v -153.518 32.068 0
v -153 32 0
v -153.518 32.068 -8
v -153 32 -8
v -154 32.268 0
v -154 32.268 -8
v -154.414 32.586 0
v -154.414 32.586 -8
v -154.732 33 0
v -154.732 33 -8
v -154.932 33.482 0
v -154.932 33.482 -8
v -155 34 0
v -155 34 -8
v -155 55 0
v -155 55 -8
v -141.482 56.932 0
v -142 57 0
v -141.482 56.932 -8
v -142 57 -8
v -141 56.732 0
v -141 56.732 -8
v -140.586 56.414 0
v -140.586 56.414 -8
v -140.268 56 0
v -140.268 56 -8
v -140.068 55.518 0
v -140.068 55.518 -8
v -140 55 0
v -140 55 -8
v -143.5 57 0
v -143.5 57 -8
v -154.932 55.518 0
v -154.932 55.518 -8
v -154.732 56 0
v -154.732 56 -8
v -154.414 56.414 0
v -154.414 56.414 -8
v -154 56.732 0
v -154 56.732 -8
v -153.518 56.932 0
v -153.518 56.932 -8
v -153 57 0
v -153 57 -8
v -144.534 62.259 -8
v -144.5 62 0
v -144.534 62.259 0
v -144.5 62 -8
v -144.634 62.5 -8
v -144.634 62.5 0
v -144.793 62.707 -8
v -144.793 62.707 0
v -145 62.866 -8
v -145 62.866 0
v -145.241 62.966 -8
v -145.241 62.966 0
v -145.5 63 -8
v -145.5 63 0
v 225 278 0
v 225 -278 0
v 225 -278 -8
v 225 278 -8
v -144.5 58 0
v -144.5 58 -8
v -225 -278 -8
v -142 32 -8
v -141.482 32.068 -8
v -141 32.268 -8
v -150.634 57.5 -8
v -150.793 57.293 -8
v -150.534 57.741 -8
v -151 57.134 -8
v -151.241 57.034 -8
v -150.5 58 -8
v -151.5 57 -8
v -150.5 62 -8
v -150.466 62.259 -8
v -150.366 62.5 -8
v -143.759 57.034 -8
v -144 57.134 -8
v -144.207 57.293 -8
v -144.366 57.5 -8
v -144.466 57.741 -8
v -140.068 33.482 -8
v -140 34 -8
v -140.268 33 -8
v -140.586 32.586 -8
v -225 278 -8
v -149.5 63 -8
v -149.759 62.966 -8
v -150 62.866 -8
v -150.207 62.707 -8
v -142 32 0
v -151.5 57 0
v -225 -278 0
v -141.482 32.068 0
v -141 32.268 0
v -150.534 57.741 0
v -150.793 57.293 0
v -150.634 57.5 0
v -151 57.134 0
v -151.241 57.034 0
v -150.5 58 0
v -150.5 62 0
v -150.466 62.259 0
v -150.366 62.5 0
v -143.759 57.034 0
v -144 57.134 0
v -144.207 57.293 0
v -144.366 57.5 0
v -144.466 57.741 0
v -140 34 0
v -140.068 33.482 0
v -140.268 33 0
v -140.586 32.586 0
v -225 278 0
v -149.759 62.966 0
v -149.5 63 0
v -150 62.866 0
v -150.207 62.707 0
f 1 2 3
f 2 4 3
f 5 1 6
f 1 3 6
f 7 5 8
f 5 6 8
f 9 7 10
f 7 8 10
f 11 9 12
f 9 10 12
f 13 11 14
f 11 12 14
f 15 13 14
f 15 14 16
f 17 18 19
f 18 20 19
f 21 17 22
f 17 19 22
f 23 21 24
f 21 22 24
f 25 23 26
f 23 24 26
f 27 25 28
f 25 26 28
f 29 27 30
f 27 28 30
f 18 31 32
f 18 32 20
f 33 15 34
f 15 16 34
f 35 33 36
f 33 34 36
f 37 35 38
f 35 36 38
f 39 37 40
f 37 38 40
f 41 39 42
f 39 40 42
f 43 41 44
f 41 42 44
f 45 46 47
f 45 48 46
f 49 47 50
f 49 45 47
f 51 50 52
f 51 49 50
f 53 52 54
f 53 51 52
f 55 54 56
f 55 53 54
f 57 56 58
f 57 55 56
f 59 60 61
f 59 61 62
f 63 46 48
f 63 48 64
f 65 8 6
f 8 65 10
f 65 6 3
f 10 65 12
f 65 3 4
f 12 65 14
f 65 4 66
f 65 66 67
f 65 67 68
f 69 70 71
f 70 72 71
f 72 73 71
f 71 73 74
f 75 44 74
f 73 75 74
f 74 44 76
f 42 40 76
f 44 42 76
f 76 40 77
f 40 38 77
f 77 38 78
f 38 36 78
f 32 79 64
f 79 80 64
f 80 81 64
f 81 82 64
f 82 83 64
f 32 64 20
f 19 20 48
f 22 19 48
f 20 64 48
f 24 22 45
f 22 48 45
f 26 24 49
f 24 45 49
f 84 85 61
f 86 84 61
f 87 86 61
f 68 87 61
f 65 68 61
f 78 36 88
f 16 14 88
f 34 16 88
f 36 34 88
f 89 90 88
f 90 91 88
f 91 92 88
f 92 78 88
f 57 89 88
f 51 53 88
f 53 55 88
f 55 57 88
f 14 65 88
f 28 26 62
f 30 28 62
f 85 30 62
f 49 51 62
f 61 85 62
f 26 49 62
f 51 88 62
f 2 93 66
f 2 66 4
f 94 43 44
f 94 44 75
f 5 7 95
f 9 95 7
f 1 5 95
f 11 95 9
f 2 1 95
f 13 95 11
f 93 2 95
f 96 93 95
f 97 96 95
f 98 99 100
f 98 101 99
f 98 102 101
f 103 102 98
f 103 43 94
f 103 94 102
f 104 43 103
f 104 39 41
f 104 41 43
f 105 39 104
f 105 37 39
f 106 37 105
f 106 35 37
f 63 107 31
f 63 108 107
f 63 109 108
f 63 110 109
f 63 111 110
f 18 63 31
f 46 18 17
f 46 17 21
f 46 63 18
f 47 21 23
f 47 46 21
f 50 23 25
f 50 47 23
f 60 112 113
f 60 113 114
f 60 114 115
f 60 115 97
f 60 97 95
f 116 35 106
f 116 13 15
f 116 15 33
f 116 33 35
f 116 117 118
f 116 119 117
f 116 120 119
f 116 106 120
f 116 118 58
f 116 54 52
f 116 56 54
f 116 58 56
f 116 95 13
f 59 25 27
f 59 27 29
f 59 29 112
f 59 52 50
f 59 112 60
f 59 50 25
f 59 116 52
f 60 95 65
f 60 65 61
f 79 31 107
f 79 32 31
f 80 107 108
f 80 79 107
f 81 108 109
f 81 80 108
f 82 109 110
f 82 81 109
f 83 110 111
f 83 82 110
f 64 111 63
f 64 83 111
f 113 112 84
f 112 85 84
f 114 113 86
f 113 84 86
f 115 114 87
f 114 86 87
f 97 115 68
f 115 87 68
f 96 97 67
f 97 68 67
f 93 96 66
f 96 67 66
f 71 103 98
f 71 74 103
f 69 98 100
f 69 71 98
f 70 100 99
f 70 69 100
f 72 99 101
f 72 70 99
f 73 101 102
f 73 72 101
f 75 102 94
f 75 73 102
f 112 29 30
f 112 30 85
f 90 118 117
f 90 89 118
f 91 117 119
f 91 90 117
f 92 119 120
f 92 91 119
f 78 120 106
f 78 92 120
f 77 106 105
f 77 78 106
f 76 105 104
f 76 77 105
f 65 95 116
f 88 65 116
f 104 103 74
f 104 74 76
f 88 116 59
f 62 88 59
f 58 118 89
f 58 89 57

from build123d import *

# Parameters (mm, degrees)
F0_W     = 450
F0_H     = 556
F1_DEPTH = 8
F2_R     = 1
F3_R     = 2


with BuildPart() as f1:
    # F0 (on Top) → F1 (new body)
    with BuildSketch(Plane.XY):
        Rectangle(F0_W, F0_H)
        Polygon((-155, 32), (-155, 57), (-150.5, 57), (-150.5, 63), (-144.5, 63), (-144.5, 57), (-140, 57), (-140, 32), align=None, mode=Mode.SUBTRACT)
    extrude(amount=-F1_DEPTH)

    # F2
    f2_edges = [f1.edges().sort_by_distance(p)[0] for p in [
        (-144.5, 57, -4),
        (-150.5, 57, -4),
        (-144.5, 63, -4),
        (-150.5, 63, -4),
    ]]
    fillet(f2_edges, radius=F2_R)

    # F3
    f3_edges = [f1.edges().sort_by_distance(p)[0] for p in [
        (-140, 57, -4),
        (-140, 32, -4),
        (-155, 57, -4),
        (-155, 32, -4),
    ]]
    fillet(f3_edges, radius=F3_R)


solid = f1.part
